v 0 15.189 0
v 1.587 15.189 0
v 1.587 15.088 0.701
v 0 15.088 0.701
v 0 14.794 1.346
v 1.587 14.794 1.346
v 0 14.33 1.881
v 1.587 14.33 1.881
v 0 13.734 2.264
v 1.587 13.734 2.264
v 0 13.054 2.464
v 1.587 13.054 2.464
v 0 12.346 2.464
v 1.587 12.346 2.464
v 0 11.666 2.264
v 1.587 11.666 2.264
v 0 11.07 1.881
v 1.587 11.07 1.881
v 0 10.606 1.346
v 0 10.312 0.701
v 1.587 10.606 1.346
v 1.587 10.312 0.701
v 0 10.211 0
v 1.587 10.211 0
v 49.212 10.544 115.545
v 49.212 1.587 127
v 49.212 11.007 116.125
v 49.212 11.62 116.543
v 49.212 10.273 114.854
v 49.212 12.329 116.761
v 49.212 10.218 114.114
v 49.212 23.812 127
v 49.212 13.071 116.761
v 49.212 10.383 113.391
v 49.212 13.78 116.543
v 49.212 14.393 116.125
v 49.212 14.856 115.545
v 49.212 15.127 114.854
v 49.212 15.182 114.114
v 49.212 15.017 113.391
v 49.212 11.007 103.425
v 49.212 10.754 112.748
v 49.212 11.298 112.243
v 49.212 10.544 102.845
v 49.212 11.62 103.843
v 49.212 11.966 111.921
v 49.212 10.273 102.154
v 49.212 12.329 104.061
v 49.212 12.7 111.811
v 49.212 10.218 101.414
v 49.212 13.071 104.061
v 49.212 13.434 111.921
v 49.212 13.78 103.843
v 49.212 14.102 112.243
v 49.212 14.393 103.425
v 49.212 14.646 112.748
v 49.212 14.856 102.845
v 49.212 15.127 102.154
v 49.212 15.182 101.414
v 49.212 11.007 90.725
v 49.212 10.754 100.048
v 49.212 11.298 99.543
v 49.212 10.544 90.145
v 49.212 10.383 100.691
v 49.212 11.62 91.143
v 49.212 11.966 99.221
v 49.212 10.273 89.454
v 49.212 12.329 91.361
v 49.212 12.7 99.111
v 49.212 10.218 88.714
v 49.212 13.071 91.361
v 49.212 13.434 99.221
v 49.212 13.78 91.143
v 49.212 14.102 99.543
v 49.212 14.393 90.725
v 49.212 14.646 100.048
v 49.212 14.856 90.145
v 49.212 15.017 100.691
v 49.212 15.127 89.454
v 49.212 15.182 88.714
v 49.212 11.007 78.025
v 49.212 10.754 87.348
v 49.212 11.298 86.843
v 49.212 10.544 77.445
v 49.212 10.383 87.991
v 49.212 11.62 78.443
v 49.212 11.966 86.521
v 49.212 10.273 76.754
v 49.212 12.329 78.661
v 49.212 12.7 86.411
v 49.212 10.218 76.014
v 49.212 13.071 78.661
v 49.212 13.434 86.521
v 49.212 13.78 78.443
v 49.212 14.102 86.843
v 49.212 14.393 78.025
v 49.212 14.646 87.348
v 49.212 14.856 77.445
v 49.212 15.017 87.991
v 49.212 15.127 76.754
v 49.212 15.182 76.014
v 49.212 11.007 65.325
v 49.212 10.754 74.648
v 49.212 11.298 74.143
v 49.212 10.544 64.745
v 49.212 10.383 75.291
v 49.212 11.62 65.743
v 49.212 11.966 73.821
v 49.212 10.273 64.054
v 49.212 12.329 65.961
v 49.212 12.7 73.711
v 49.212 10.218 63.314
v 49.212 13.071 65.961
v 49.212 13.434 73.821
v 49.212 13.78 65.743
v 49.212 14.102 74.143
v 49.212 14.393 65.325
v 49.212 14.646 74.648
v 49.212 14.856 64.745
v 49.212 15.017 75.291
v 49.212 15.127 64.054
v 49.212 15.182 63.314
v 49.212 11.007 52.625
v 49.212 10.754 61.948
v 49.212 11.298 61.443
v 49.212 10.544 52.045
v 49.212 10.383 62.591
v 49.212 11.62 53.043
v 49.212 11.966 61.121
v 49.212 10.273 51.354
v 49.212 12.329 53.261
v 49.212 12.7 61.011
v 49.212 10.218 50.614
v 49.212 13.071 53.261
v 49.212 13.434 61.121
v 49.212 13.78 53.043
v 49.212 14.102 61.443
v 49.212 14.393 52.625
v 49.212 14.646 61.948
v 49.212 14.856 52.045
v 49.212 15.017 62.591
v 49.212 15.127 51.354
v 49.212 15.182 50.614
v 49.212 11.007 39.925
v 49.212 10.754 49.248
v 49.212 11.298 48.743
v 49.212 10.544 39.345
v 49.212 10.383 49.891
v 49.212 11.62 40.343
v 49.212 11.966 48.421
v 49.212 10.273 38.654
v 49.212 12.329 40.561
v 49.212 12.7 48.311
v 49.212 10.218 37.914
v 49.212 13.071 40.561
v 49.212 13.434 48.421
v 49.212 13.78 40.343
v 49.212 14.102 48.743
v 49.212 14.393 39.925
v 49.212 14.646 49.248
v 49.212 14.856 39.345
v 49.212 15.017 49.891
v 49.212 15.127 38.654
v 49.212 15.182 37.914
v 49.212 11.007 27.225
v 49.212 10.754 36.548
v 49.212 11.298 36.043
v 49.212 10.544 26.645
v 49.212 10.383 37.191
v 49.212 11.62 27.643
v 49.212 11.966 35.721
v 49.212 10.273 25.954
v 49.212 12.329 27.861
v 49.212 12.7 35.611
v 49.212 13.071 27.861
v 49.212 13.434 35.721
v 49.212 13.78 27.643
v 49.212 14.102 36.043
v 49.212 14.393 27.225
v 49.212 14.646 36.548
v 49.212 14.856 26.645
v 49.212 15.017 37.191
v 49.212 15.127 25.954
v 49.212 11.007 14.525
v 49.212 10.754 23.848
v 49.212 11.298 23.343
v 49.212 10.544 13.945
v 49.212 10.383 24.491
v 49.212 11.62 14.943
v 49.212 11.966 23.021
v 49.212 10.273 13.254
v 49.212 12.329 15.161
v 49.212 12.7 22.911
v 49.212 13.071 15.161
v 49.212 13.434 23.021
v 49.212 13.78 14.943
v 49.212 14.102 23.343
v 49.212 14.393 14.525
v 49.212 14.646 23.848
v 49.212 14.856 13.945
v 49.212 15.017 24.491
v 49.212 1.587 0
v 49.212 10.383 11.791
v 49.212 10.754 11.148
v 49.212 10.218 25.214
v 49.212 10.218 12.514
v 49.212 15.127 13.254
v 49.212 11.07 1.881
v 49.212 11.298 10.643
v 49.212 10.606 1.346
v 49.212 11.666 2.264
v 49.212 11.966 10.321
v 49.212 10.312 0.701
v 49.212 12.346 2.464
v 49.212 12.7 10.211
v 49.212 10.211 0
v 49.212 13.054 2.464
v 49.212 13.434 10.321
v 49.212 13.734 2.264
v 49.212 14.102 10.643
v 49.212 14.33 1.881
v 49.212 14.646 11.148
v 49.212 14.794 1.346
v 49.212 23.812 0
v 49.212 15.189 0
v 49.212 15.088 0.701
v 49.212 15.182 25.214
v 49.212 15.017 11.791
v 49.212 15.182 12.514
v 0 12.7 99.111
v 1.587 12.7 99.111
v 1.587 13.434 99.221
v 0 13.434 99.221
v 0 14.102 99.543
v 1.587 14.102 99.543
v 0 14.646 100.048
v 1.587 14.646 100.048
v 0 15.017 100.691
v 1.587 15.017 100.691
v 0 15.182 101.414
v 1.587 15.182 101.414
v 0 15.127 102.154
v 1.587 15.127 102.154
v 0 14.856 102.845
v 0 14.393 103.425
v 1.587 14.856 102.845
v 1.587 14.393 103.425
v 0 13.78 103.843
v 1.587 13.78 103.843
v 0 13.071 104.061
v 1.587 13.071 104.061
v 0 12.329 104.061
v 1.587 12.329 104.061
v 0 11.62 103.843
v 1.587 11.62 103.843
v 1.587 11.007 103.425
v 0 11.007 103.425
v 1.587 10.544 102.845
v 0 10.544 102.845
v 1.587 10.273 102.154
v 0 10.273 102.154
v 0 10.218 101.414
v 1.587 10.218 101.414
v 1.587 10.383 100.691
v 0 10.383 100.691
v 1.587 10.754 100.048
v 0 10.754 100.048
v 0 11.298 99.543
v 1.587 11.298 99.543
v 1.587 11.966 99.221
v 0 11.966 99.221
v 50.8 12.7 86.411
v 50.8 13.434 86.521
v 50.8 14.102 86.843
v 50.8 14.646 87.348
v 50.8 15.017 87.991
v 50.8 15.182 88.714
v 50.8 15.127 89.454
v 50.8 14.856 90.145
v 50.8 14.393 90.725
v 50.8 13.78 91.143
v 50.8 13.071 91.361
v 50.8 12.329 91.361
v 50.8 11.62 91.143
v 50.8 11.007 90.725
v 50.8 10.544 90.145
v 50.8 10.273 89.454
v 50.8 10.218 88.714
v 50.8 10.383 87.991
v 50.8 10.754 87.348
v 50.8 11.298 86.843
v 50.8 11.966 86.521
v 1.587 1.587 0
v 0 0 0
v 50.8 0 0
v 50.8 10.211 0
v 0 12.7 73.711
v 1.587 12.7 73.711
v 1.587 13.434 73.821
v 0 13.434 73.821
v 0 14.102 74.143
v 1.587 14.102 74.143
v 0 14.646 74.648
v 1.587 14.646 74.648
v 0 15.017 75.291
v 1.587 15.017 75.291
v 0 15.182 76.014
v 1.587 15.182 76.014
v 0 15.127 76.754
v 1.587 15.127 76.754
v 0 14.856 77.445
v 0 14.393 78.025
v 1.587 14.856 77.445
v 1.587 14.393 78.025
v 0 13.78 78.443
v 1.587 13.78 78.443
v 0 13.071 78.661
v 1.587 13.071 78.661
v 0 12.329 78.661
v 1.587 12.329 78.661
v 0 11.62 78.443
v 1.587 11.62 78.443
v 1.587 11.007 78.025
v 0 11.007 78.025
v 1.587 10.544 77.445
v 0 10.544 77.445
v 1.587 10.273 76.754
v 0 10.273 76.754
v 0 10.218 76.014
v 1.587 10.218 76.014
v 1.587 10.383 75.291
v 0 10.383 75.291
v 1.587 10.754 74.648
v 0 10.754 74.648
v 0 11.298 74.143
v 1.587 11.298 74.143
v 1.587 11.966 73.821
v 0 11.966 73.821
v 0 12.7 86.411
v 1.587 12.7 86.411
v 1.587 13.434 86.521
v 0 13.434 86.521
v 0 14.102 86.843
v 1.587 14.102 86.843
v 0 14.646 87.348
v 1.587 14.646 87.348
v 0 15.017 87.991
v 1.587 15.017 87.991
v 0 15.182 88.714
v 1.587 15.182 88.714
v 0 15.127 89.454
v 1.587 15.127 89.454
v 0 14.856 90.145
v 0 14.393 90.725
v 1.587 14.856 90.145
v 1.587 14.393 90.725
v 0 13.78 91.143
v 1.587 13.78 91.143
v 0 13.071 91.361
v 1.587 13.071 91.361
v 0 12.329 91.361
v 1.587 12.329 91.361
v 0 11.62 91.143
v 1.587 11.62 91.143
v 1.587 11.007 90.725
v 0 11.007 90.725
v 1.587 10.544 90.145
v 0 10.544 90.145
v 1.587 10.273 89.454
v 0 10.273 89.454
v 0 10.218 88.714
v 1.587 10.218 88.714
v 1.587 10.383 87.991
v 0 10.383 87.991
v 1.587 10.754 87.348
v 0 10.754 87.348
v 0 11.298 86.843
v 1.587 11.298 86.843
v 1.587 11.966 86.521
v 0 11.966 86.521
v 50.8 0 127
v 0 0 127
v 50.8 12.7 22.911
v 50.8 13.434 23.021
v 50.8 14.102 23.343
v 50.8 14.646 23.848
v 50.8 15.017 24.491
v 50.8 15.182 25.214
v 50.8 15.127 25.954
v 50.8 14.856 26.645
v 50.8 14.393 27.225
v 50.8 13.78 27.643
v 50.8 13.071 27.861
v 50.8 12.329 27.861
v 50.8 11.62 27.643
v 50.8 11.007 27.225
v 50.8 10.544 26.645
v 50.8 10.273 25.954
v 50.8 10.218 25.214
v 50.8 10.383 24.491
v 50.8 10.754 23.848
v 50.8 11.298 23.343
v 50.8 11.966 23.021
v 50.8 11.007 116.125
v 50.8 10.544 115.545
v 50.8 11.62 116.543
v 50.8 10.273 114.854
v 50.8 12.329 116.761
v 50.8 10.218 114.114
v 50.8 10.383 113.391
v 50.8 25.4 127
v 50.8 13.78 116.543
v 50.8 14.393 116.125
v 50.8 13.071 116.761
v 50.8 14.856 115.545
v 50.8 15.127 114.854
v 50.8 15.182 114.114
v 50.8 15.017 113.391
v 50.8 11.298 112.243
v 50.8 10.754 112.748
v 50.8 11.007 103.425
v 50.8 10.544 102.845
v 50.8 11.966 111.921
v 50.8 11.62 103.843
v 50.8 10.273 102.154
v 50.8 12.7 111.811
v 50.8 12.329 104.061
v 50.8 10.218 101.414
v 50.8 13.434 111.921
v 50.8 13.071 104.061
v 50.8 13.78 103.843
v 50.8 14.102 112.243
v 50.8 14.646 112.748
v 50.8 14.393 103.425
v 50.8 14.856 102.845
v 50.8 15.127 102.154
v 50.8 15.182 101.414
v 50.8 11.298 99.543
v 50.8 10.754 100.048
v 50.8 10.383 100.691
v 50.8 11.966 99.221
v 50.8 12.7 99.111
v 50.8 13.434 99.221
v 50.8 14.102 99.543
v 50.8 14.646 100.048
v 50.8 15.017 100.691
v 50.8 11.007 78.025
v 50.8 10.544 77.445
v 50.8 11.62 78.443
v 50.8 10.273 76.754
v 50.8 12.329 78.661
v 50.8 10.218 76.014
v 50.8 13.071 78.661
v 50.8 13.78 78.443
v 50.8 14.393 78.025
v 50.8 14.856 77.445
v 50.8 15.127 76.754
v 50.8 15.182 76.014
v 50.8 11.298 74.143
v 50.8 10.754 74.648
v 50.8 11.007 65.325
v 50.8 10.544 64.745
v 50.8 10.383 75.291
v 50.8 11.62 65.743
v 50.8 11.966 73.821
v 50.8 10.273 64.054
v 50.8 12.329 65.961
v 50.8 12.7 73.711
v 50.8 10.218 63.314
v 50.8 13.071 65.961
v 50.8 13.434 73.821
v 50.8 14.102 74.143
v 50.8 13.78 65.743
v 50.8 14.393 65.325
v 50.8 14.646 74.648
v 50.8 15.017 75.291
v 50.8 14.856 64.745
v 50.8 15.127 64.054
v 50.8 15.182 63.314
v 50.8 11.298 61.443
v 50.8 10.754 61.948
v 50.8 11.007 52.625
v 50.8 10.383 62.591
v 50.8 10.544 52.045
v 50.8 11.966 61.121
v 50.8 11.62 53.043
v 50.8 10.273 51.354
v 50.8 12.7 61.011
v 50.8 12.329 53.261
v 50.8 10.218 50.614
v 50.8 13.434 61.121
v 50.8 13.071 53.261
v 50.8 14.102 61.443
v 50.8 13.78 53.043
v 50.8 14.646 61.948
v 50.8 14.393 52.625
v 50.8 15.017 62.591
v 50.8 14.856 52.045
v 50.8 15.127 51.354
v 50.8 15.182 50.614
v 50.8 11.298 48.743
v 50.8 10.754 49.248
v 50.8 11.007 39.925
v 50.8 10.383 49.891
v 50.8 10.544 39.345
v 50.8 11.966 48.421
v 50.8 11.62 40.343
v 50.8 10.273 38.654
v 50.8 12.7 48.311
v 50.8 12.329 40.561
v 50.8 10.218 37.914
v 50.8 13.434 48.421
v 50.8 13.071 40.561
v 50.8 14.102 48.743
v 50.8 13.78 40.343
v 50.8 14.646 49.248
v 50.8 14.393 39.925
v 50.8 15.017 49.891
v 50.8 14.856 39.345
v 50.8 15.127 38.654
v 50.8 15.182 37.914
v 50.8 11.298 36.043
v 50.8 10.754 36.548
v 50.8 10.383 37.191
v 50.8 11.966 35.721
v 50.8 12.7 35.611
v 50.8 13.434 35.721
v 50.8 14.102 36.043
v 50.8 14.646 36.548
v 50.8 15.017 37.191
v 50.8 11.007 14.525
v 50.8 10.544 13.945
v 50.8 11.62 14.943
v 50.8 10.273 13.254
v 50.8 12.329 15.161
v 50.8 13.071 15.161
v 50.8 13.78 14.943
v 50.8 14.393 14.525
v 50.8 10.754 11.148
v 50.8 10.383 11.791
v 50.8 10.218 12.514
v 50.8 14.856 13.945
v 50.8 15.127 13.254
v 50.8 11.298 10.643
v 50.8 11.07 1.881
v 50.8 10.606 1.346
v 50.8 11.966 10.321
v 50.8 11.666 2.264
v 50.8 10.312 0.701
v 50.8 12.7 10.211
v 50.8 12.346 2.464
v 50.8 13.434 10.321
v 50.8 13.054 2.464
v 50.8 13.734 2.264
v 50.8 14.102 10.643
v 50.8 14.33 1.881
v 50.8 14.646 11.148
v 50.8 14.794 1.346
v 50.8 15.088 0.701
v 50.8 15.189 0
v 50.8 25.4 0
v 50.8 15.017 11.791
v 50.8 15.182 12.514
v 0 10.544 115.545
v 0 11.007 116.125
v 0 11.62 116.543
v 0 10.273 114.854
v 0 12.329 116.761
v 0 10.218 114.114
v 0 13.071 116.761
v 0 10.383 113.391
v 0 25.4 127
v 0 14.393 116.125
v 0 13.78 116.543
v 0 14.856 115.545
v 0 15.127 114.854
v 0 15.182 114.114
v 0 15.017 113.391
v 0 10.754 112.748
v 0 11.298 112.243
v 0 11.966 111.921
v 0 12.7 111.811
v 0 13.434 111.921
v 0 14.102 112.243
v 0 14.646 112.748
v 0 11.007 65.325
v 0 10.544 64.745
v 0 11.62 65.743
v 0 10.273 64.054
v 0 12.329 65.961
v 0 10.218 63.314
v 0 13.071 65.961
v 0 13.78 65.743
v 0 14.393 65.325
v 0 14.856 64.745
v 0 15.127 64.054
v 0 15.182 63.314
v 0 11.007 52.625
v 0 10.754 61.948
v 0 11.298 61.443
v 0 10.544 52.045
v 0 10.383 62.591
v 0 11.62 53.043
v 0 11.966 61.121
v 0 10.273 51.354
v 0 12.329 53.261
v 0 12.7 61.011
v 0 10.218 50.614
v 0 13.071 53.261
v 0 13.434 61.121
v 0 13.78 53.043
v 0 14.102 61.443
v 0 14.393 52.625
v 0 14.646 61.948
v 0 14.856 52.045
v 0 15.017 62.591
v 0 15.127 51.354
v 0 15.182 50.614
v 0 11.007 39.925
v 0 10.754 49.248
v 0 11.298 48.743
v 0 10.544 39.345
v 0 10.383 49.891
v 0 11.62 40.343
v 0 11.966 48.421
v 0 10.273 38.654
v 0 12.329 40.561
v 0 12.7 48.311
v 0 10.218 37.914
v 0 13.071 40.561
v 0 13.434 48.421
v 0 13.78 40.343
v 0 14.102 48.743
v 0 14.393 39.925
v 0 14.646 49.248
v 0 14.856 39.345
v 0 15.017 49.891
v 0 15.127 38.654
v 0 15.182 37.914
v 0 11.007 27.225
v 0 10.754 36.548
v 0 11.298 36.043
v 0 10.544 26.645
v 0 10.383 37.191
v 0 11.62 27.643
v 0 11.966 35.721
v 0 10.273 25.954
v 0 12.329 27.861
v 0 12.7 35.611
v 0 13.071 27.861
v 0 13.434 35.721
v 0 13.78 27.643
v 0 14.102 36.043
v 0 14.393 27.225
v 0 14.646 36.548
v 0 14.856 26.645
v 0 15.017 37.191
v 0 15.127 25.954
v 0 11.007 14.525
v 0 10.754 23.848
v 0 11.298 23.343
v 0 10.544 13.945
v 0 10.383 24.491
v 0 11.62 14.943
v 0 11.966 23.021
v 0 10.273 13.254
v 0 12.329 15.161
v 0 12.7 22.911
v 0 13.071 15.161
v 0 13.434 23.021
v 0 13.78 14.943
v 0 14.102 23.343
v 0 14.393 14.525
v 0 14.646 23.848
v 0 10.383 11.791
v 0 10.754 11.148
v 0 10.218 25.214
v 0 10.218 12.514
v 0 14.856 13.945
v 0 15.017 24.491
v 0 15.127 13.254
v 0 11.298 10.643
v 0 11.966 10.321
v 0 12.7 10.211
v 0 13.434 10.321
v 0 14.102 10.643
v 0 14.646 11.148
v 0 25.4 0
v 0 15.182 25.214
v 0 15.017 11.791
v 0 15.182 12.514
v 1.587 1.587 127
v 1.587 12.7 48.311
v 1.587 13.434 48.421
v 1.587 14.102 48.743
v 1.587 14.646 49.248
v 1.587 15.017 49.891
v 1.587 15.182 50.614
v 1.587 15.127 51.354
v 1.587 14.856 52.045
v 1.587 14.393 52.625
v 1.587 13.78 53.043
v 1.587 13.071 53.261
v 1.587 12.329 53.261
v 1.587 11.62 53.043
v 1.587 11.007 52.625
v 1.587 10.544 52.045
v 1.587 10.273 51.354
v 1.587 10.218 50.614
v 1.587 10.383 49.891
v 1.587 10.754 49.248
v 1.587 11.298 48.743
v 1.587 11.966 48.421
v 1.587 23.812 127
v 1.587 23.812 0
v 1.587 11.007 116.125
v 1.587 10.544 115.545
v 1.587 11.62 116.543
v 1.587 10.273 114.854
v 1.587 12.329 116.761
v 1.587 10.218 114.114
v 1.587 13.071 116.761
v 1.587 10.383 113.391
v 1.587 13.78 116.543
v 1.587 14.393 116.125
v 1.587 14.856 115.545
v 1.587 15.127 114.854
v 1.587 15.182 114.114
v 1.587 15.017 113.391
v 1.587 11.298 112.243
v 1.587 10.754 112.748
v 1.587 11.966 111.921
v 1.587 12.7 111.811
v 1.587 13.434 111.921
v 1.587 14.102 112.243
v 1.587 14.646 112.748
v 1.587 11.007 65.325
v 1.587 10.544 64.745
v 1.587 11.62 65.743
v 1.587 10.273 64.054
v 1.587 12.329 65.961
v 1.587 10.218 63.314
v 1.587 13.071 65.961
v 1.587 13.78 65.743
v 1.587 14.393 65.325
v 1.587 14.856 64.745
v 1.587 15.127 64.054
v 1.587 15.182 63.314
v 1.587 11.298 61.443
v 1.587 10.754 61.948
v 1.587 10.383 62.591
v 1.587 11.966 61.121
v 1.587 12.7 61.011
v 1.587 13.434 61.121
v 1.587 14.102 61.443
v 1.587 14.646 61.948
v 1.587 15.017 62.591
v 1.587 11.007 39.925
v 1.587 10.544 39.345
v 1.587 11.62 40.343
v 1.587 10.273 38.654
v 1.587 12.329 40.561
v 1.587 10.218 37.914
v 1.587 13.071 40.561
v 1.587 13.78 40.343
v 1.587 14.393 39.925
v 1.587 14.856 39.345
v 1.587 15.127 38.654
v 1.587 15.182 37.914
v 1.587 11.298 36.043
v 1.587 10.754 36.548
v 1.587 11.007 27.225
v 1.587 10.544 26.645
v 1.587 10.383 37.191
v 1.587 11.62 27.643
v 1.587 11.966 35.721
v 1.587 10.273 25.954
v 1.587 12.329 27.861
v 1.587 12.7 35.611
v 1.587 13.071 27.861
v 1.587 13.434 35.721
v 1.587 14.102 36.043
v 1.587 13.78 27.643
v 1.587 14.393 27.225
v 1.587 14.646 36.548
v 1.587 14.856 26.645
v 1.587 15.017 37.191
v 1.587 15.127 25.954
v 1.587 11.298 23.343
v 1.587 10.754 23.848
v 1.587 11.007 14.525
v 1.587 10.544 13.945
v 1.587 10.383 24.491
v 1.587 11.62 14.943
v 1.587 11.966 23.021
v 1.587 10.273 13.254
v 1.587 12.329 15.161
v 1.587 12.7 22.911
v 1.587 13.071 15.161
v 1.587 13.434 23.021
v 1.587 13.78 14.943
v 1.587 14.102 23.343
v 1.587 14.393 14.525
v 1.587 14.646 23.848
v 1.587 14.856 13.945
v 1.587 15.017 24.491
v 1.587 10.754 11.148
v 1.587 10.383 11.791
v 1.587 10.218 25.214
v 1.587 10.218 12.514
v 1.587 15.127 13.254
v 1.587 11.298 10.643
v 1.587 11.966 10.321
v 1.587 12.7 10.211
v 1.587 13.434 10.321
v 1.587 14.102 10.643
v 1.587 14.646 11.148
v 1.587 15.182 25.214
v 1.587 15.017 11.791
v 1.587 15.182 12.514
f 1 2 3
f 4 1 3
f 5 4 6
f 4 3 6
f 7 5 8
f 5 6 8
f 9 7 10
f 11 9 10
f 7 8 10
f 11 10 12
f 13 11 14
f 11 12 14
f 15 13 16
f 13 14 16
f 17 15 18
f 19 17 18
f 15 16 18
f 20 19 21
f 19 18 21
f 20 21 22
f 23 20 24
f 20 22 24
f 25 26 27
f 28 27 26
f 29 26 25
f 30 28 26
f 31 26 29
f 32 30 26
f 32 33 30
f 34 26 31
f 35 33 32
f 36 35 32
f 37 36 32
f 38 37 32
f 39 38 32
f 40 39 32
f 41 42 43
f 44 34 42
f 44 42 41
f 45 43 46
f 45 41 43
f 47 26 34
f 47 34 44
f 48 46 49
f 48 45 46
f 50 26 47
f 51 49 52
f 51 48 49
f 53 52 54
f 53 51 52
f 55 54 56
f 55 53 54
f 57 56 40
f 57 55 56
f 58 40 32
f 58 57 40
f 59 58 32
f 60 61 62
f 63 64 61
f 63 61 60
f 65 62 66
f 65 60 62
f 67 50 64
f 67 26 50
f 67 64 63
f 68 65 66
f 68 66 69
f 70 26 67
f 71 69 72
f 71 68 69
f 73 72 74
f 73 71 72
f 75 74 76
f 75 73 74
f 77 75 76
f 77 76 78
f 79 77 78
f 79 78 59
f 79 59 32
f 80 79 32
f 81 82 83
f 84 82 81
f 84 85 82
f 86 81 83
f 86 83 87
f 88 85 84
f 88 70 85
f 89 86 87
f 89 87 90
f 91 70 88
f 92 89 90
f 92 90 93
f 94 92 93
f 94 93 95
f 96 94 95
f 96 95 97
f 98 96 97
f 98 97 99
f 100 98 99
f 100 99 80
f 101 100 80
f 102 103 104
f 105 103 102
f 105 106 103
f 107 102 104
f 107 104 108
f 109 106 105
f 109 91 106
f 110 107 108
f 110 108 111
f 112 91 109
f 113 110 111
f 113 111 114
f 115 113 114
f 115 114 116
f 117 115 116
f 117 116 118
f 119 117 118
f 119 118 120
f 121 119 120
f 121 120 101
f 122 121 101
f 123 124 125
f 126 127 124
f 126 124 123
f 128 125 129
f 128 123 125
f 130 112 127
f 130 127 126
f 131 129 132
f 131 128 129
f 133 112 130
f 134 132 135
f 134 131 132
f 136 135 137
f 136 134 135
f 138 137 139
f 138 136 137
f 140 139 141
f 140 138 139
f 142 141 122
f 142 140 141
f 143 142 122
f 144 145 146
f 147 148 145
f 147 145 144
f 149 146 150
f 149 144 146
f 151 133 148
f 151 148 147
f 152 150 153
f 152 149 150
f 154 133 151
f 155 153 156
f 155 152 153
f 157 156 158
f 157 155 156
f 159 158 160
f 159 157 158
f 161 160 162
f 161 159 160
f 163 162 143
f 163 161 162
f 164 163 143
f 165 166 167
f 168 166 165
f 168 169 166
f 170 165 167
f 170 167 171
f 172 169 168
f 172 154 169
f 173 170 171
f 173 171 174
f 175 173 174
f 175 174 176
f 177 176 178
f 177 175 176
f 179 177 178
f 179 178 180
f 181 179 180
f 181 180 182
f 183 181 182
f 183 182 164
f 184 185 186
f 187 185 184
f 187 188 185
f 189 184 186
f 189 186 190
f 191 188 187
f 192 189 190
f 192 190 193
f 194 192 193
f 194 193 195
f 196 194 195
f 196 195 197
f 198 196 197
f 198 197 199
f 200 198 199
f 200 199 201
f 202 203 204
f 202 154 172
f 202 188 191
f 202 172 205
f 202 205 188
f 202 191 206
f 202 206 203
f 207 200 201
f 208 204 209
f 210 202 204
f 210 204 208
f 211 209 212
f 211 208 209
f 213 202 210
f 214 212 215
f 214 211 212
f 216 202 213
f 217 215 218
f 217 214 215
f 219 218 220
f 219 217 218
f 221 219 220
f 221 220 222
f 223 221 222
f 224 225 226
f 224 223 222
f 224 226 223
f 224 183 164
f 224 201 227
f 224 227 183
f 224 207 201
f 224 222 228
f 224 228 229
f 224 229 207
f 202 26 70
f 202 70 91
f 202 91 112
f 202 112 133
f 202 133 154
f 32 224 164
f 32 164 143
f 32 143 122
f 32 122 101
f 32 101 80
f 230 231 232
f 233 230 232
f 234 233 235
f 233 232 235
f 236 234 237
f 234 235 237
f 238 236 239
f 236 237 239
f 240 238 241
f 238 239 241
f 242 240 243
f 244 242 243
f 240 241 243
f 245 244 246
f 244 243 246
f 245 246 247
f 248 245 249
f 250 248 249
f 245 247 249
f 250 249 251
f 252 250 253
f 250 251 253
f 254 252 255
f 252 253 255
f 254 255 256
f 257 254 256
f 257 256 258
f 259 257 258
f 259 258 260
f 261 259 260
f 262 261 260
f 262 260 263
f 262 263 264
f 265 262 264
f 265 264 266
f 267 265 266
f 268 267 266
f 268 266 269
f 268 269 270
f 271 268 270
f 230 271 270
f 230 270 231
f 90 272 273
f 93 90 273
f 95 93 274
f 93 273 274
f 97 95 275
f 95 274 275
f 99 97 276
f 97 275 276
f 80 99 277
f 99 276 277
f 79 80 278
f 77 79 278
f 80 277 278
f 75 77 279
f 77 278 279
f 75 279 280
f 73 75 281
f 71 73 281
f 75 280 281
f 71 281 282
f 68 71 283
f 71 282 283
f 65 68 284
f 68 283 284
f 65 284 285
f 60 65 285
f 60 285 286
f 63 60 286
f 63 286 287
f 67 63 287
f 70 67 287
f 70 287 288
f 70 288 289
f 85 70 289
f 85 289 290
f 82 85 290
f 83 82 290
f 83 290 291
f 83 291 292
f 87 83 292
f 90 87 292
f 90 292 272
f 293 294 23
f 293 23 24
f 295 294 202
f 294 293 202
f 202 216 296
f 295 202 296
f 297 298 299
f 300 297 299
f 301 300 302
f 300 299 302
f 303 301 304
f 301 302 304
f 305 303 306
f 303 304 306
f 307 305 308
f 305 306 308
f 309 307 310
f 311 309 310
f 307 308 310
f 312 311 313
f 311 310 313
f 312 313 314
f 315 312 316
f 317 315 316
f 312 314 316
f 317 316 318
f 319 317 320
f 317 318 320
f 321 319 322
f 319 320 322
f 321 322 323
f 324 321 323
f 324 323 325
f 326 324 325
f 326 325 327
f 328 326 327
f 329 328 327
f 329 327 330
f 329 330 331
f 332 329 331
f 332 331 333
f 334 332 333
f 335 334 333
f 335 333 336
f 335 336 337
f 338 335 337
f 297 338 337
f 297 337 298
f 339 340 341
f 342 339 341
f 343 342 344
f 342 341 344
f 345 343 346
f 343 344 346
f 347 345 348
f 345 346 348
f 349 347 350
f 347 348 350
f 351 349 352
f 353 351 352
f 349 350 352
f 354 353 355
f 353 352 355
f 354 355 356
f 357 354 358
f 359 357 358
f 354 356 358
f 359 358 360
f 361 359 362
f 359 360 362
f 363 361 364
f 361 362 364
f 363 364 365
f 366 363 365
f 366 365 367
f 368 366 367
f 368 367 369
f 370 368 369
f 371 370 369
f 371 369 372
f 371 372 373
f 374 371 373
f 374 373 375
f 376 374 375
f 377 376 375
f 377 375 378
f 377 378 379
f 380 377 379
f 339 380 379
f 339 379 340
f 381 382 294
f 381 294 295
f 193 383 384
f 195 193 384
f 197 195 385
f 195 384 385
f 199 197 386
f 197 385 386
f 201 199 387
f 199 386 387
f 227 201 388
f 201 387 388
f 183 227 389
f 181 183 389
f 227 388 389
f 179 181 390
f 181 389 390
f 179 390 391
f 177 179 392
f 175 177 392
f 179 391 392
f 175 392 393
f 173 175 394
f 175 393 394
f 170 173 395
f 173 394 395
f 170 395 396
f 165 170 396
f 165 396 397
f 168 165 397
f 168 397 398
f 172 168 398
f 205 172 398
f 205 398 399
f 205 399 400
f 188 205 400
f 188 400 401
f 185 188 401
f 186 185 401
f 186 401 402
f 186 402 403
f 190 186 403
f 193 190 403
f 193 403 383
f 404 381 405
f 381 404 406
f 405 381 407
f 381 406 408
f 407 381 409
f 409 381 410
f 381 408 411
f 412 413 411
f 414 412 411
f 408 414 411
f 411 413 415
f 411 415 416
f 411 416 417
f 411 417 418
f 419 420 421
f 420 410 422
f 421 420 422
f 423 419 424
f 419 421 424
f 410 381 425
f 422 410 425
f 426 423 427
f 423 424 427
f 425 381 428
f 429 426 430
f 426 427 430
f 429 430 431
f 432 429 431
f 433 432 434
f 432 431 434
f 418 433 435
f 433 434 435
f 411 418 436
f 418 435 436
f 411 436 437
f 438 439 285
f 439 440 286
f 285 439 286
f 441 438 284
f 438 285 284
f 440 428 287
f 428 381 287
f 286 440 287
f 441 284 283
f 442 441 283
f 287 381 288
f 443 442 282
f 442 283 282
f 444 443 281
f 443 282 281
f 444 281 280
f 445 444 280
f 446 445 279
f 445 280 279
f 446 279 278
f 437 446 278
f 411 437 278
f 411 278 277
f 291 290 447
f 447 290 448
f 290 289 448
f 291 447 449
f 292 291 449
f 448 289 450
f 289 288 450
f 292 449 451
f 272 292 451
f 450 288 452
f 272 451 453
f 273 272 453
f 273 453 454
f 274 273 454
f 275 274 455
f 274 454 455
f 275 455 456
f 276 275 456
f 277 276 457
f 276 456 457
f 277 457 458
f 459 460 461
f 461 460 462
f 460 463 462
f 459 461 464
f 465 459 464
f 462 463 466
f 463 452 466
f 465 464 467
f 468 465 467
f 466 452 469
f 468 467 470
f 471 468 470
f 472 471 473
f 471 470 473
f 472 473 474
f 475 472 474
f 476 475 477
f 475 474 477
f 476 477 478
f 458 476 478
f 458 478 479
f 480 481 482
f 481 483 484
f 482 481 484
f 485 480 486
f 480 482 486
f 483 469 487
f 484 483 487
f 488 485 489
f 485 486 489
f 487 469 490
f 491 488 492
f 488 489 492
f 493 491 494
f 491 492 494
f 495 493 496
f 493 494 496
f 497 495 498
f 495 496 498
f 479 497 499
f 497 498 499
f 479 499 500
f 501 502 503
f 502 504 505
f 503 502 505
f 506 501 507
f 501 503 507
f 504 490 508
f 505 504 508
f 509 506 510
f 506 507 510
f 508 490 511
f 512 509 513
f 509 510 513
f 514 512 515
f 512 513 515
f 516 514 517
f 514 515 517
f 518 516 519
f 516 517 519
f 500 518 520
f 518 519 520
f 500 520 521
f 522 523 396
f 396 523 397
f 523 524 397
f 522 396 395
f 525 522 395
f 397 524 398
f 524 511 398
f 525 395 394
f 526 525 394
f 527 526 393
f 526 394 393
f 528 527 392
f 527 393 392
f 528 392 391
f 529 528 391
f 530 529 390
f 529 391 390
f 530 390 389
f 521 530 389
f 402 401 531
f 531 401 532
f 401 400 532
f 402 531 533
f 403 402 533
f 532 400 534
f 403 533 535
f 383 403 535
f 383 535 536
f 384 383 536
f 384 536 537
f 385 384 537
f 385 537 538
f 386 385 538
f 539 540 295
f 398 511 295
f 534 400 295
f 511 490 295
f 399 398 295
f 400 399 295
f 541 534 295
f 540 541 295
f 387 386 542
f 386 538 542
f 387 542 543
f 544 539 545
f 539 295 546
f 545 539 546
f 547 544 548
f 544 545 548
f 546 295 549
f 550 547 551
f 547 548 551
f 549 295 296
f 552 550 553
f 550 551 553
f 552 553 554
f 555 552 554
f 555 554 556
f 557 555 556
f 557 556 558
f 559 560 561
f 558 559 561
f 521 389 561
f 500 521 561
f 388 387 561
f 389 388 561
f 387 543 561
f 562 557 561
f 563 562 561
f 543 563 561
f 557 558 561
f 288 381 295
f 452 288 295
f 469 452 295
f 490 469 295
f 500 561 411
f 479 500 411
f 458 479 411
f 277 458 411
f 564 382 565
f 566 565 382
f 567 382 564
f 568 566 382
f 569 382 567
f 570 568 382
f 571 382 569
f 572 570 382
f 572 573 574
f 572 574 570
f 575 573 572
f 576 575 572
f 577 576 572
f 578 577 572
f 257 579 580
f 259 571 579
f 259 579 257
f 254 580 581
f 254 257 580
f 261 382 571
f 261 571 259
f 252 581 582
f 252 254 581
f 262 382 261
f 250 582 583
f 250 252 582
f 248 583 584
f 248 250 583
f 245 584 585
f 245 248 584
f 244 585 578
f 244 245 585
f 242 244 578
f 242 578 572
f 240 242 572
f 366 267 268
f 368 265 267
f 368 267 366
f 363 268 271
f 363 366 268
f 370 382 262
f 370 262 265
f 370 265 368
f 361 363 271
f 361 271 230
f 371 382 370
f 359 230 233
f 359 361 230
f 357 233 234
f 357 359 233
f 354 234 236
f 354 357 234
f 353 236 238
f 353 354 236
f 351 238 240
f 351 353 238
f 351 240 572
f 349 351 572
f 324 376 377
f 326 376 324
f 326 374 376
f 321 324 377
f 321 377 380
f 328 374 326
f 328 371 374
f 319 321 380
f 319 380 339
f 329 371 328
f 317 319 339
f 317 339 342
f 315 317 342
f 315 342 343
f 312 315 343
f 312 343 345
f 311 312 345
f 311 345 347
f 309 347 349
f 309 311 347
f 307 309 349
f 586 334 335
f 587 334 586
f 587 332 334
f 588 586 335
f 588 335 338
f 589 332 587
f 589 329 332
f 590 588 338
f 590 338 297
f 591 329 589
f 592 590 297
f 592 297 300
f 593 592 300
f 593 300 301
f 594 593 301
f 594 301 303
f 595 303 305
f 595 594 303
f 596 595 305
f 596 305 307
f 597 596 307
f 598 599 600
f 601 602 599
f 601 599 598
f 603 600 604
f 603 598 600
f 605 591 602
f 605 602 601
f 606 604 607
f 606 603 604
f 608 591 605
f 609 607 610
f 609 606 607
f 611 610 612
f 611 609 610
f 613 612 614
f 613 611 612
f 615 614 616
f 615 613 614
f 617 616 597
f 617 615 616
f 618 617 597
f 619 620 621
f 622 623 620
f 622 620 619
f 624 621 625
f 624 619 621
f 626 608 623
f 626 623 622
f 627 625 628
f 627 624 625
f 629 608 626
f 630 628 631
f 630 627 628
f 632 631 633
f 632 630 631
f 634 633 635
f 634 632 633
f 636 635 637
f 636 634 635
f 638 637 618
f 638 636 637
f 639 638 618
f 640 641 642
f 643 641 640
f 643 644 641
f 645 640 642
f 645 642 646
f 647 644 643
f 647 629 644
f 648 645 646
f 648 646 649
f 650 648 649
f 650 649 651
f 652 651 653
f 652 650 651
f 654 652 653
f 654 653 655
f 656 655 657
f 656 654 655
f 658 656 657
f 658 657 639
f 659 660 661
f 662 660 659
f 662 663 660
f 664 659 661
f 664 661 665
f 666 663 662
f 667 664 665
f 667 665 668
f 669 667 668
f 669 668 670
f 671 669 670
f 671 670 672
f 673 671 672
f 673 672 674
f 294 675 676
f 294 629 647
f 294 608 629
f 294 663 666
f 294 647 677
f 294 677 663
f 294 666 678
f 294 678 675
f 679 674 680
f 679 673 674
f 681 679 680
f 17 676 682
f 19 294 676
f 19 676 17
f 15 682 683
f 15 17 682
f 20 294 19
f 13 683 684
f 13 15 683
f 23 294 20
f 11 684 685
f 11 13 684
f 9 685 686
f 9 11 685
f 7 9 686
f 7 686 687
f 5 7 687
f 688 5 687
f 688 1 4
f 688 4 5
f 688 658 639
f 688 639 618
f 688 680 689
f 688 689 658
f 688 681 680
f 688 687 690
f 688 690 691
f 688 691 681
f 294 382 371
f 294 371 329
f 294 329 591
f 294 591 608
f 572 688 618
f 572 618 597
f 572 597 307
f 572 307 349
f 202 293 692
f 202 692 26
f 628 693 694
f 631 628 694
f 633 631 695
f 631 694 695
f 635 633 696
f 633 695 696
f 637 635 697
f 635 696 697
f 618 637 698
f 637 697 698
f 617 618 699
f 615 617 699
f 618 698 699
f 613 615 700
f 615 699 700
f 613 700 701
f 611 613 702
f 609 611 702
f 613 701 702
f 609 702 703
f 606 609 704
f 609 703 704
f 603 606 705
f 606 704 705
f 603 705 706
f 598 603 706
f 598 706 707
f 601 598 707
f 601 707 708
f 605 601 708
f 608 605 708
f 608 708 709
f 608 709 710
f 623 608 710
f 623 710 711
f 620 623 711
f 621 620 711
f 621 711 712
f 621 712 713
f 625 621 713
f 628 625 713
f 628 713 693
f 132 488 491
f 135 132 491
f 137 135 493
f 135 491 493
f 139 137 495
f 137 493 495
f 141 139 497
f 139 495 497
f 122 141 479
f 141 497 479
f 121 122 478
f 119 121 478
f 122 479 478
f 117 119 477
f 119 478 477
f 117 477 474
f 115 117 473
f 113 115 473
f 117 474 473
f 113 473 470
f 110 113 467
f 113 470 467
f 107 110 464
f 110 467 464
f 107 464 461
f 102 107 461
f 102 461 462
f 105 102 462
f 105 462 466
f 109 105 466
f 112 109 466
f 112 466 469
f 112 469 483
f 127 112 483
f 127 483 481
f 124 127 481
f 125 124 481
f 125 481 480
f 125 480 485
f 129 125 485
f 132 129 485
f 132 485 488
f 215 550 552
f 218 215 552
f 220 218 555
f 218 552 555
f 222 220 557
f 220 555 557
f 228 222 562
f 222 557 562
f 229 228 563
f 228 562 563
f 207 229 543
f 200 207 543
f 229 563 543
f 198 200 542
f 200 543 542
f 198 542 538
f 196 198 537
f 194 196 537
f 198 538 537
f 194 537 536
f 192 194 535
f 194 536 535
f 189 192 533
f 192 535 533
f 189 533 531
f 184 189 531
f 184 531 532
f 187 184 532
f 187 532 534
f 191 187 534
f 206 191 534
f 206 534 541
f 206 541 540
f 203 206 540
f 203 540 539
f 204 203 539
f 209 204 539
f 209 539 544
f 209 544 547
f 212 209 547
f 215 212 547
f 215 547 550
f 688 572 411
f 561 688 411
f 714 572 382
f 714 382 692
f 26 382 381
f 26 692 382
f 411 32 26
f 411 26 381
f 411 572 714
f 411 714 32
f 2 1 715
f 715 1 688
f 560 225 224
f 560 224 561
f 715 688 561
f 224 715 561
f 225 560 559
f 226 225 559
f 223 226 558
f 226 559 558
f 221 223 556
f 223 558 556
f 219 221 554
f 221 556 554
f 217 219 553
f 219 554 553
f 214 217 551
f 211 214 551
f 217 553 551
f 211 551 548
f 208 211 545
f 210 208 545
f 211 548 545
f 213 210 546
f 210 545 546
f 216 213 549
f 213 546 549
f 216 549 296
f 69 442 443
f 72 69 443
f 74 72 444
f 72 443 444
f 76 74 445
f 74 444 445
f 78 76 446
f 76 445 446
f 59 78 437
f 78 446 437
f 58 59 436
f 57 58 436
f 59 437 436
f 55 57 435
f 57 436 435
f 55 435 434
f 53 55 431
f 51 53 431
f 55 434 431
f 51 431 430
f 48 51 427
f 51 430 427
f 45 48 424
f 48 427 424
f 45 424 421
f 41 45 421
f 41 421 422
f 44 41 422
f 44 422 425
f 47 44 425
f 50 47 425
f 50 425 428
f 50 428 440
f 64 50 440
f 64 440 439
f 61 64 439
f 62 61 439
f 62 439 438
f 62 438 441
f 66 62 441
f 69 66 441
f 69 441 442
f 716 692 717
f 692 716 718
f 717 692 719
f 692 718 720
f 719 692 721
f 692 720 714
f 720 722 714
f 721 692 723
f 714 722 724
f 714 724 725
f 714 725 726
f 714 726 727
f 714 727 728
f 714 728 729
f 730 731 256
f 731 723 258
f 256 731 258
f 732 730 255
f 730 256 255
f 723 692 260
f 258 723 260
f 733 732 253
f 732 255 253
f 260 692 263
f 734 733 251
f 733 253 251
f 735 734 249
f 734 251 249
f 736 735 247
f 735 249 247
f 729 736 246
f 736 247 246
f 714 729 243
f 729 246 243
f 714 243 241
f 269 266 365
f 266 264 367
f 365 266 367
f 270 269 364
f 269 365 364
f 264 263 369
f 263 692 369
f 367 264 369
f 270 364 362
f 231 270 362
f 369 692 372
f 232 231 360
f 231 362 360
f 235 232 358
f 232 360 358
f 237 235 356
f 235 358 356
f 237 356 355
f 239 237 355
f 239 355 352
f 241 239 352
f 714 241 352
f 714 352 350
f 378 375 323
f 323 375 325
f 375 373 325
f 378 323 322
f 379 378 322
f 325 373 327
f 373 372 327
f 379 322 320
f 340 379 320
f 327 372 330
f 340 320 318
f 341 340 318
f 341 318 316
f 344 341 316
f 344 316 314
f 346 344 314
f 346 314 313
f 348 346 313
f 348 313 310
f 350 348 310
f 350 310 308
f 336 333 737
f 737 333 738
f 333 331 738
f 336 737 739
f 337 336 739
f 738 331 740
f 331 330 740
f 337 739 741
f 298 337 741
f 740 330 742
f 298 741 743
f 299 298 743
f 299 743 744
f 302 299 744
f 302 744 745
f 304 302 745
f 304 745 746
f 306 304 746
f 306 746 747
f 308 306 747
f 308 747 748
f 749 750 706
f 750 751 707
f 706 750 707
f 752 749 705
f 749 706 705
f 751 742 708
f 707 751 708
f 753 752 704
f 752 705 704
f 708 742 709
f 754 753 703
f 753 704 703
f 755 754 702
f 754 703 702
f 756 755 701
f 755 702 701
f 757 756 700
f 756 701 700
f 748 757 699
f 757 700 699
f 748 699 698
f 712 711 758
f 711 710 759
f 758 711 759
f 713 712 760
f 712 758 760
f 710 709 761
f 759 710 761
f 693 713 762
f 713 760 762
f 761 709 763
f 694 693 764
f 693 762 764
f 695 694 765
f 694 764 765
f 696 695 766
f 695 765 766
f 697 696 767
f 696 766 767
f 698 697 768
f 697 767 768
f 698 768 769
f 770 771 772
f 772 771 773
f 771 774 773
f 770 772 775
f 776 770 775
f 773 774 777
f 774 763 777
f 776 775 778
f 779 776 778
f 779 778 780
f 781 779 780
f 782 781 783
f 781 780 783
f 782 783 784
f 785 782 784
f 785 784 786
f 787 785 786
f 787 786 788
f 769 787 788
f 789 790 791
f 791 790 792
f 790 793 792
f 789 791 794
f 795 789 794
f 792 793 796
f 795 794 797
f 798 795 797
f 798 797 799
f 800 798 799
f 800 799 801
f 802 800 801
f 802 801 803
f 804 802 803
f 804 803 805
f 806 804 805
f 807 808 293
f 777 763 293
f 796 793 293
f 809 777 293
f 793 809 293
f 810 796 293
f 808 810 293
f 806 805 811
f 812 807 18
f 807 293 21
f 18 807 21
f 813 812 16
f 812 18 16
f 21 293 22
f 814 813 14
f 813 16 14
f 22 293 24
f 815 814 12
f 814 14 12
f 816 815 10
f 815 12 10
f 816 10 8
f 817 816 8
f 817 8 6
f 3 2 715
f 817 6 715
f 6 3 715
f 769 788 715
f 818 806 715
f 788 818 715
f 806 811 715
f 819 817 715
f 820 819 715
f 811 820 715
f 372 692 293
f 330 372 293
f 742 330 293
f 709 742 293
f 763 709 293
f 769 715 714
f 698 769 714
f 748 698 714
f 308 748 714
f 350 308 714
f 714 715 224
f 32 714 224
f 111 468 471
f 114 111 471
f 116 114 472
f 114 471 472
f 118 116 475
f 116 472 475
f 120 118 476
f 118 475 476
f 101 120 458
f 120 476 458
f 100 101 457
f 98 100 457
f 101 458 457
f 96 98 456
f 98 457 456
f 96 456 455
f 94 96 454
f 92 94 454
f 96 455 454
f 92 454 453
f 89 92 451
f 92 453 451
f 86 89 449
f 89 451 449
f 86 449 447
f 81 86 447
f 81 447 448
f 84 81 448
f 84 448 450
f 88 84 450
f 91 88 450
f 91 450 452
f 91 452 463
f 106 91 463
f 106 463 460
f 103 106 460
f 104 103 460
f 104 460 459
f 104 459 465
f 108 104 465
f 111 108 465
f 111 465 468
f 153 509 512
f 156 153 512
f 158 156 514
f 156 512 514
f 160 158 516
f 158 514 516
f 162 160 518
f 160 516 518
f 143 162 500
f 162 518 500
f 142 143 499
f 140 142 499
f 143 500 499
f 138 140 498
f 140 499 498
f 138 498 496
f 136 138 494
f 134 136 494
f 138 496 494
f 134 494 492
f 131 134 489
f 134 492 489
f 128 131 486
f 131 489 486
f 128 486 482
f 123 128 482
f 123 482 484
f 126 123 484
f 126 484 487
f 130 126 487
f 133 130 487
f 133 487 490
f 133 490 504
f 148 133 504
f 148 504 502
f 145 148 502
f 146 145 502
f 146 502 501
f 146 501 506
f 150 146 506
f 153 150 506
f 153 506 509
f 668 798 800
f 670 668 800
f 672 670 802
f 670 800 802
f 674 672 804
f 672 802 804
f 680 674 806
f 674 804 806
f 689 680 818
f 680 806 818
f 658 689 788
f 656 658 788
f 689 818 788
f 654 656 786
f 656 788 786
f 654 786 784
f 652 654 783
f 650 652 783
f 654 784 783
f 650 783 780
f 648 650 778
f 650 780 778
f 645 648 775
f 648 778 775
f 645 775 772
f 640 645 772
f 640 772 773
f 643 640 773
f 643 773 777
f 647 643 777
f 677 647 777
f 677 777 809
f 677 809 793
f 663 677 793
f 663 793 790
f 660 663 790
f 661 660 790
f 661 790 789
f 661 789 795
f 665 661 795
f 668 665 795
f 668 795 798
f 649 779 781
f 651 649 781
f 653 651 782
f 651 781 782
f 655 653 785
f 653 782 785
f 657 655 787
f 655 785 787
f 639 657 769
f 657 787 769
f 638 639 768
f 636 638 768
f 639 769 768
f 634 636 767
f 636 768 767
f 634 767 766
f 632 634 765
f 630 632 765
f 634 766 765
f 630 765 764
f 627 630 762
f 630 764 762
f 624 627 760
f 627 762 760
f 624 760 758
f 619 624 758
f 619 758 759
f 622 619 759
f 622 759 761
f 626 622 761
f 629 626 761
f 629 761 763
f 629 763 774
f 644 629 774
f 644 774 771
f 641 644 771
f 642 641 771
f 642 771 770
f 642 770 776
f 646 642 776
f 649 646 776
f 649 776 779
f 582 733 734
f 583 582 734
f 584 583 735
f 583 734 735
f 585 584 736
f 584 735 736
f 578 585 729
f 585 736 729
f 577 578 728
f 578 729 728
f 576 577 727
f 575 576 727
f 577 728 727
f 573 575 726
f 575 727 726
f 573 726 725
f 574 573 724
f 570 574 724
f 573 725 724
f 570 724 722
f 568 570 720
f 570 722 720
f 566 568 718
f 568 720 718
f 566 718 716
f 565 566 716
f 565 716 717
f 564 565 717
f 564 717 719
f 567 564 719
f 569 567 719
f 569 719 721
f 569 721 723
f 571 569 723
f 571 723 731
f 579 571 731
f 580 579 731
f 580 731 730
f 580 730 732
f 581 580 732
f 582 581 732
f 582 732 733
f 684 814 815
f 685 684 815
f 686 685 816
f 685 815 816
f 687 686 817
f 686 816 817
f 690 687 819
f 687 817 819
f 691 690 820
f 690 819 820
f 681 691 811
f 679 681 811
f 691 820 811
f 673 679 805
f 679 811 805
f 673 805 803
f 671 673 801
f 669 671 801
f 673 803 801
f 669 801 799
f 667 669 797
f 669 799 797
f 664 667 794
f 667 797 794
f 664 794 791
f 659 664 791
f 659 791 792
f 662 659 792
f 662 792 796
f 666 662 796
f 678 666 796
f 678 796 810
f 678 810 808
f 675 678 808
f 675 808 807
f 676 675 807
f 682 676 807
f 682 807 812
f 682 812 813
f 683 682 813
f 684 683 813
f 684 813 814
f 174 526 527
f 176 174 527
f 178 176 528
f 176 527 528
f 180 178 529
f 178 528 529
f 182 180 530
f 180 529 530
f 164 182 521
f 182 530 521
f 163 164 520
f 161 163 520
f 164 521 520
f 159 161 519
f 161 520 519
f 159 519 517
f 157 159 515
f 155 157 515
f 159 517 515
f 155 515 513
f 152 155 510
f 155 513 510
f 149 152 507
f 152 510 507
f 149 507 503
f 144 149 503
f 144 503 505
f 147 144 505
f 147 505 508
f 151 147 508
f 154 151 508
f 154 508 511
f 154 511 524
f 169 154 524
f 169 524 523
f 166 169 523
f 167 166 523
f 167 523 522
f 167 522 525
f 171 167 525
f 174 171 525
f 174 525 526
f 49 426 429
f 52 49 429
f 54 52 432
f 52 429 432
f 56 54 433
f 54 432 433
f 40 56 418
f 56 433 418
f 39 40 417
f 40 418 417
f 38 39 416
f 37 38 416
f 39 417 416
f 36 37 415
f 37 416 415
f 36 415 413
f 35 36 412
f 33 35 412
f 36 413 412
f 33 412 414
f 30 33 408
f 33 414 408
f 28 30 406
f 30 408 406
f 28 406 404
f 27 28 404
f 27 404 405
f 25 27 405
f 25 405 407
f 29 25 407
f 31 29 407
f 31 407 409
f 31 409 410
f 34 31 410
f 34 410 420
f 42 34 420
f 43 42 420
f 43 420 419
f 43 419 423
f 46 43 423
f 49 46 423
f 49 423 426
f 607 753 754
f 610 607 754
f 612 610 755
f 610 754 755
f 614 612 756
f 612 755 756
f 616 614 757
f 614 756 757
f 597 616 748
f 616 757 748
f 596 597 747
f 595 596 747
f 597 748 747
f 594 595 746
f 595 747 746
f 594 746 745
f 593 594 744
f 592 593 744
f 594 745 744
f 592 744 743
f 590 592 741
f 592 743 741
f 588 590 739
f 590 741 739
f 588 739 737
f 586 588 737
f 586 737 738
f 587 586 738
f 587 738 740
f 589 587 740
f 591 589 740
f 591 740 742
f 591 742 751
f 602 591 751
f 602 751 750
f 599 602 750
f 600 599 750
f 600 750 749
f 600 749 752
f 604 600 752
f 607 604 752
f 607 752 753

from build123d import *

# Parameters (mm, degrees)
SKETCH1_W           = 50.8
SKETCH1_H           = 25.4
SKETCH1_W_2         = 47.625
SKETCH1_H_2         = 22.225
BOSS_EXTRUDE1_DEPTH = 127
SKETCH2_R           = 2.4892
CUT_EXTRUDE1_DEPTH  = 51.8


with BuildPart() as part:
    # Sketch1 → Boss-Extrude1 (new body)
    with BuildSketch(Plane.XY):
        with Locations((25.4, 12.7)):
            Rectangle(SKETCH1_W, SKETCH1_H)
        with Locations((25.4, 12.7)):
            Rectangle(SKETCH1_W_2, SKETCH1_H_2, mode=Mode.SUBTRACT)
    extrude(amount=BOSS_EXTRUDE1_DEPTH)

    # Sketch2 → Cut-Extrude1 (cut, through all)
    with BuildSketch(Plane(origin=(50.8, 0, 0), x_dir=(0, 0, -1), z_dir=(1, 0, 0))):
        with Locations((-114.3, 12.7)):
            Circle(SKETCH2_R)
        with Locations((-101.6, 12.7)):
            Circle(SKETCH2_R)
        with Locations((-88.9, 12.7)):
            Circle(SKETCH2_R)
        with Locations((-76.2, 12.7)):
            Circle(SKETCH2_R)
        with Locations((-63.5, 12.7)):
            Circle(SKETCH2_R)
        with Locations((-50.8, 12.7)):
            Circle(SKETCH2_R)
        with Locations((-38.1, 12.7)):
            Circle(SKETCH2_R)
        with Locations((-25.4, 12.7)):
            Circle(SKETCH2_R)
        with Locations((-12.7, 12.7)):
            Circle(SKETCH2_R)
        with Locations((0, 12.7)):
            Circle(SKETCH2_R)
        with Locations((12.7, 12.7)):
            Circle(SKETCH2_R)
    extrude(amount=-CUT_EXTRUDE1_DEPTH, mode=Mode.SUBTRACT)


solid = part.part
